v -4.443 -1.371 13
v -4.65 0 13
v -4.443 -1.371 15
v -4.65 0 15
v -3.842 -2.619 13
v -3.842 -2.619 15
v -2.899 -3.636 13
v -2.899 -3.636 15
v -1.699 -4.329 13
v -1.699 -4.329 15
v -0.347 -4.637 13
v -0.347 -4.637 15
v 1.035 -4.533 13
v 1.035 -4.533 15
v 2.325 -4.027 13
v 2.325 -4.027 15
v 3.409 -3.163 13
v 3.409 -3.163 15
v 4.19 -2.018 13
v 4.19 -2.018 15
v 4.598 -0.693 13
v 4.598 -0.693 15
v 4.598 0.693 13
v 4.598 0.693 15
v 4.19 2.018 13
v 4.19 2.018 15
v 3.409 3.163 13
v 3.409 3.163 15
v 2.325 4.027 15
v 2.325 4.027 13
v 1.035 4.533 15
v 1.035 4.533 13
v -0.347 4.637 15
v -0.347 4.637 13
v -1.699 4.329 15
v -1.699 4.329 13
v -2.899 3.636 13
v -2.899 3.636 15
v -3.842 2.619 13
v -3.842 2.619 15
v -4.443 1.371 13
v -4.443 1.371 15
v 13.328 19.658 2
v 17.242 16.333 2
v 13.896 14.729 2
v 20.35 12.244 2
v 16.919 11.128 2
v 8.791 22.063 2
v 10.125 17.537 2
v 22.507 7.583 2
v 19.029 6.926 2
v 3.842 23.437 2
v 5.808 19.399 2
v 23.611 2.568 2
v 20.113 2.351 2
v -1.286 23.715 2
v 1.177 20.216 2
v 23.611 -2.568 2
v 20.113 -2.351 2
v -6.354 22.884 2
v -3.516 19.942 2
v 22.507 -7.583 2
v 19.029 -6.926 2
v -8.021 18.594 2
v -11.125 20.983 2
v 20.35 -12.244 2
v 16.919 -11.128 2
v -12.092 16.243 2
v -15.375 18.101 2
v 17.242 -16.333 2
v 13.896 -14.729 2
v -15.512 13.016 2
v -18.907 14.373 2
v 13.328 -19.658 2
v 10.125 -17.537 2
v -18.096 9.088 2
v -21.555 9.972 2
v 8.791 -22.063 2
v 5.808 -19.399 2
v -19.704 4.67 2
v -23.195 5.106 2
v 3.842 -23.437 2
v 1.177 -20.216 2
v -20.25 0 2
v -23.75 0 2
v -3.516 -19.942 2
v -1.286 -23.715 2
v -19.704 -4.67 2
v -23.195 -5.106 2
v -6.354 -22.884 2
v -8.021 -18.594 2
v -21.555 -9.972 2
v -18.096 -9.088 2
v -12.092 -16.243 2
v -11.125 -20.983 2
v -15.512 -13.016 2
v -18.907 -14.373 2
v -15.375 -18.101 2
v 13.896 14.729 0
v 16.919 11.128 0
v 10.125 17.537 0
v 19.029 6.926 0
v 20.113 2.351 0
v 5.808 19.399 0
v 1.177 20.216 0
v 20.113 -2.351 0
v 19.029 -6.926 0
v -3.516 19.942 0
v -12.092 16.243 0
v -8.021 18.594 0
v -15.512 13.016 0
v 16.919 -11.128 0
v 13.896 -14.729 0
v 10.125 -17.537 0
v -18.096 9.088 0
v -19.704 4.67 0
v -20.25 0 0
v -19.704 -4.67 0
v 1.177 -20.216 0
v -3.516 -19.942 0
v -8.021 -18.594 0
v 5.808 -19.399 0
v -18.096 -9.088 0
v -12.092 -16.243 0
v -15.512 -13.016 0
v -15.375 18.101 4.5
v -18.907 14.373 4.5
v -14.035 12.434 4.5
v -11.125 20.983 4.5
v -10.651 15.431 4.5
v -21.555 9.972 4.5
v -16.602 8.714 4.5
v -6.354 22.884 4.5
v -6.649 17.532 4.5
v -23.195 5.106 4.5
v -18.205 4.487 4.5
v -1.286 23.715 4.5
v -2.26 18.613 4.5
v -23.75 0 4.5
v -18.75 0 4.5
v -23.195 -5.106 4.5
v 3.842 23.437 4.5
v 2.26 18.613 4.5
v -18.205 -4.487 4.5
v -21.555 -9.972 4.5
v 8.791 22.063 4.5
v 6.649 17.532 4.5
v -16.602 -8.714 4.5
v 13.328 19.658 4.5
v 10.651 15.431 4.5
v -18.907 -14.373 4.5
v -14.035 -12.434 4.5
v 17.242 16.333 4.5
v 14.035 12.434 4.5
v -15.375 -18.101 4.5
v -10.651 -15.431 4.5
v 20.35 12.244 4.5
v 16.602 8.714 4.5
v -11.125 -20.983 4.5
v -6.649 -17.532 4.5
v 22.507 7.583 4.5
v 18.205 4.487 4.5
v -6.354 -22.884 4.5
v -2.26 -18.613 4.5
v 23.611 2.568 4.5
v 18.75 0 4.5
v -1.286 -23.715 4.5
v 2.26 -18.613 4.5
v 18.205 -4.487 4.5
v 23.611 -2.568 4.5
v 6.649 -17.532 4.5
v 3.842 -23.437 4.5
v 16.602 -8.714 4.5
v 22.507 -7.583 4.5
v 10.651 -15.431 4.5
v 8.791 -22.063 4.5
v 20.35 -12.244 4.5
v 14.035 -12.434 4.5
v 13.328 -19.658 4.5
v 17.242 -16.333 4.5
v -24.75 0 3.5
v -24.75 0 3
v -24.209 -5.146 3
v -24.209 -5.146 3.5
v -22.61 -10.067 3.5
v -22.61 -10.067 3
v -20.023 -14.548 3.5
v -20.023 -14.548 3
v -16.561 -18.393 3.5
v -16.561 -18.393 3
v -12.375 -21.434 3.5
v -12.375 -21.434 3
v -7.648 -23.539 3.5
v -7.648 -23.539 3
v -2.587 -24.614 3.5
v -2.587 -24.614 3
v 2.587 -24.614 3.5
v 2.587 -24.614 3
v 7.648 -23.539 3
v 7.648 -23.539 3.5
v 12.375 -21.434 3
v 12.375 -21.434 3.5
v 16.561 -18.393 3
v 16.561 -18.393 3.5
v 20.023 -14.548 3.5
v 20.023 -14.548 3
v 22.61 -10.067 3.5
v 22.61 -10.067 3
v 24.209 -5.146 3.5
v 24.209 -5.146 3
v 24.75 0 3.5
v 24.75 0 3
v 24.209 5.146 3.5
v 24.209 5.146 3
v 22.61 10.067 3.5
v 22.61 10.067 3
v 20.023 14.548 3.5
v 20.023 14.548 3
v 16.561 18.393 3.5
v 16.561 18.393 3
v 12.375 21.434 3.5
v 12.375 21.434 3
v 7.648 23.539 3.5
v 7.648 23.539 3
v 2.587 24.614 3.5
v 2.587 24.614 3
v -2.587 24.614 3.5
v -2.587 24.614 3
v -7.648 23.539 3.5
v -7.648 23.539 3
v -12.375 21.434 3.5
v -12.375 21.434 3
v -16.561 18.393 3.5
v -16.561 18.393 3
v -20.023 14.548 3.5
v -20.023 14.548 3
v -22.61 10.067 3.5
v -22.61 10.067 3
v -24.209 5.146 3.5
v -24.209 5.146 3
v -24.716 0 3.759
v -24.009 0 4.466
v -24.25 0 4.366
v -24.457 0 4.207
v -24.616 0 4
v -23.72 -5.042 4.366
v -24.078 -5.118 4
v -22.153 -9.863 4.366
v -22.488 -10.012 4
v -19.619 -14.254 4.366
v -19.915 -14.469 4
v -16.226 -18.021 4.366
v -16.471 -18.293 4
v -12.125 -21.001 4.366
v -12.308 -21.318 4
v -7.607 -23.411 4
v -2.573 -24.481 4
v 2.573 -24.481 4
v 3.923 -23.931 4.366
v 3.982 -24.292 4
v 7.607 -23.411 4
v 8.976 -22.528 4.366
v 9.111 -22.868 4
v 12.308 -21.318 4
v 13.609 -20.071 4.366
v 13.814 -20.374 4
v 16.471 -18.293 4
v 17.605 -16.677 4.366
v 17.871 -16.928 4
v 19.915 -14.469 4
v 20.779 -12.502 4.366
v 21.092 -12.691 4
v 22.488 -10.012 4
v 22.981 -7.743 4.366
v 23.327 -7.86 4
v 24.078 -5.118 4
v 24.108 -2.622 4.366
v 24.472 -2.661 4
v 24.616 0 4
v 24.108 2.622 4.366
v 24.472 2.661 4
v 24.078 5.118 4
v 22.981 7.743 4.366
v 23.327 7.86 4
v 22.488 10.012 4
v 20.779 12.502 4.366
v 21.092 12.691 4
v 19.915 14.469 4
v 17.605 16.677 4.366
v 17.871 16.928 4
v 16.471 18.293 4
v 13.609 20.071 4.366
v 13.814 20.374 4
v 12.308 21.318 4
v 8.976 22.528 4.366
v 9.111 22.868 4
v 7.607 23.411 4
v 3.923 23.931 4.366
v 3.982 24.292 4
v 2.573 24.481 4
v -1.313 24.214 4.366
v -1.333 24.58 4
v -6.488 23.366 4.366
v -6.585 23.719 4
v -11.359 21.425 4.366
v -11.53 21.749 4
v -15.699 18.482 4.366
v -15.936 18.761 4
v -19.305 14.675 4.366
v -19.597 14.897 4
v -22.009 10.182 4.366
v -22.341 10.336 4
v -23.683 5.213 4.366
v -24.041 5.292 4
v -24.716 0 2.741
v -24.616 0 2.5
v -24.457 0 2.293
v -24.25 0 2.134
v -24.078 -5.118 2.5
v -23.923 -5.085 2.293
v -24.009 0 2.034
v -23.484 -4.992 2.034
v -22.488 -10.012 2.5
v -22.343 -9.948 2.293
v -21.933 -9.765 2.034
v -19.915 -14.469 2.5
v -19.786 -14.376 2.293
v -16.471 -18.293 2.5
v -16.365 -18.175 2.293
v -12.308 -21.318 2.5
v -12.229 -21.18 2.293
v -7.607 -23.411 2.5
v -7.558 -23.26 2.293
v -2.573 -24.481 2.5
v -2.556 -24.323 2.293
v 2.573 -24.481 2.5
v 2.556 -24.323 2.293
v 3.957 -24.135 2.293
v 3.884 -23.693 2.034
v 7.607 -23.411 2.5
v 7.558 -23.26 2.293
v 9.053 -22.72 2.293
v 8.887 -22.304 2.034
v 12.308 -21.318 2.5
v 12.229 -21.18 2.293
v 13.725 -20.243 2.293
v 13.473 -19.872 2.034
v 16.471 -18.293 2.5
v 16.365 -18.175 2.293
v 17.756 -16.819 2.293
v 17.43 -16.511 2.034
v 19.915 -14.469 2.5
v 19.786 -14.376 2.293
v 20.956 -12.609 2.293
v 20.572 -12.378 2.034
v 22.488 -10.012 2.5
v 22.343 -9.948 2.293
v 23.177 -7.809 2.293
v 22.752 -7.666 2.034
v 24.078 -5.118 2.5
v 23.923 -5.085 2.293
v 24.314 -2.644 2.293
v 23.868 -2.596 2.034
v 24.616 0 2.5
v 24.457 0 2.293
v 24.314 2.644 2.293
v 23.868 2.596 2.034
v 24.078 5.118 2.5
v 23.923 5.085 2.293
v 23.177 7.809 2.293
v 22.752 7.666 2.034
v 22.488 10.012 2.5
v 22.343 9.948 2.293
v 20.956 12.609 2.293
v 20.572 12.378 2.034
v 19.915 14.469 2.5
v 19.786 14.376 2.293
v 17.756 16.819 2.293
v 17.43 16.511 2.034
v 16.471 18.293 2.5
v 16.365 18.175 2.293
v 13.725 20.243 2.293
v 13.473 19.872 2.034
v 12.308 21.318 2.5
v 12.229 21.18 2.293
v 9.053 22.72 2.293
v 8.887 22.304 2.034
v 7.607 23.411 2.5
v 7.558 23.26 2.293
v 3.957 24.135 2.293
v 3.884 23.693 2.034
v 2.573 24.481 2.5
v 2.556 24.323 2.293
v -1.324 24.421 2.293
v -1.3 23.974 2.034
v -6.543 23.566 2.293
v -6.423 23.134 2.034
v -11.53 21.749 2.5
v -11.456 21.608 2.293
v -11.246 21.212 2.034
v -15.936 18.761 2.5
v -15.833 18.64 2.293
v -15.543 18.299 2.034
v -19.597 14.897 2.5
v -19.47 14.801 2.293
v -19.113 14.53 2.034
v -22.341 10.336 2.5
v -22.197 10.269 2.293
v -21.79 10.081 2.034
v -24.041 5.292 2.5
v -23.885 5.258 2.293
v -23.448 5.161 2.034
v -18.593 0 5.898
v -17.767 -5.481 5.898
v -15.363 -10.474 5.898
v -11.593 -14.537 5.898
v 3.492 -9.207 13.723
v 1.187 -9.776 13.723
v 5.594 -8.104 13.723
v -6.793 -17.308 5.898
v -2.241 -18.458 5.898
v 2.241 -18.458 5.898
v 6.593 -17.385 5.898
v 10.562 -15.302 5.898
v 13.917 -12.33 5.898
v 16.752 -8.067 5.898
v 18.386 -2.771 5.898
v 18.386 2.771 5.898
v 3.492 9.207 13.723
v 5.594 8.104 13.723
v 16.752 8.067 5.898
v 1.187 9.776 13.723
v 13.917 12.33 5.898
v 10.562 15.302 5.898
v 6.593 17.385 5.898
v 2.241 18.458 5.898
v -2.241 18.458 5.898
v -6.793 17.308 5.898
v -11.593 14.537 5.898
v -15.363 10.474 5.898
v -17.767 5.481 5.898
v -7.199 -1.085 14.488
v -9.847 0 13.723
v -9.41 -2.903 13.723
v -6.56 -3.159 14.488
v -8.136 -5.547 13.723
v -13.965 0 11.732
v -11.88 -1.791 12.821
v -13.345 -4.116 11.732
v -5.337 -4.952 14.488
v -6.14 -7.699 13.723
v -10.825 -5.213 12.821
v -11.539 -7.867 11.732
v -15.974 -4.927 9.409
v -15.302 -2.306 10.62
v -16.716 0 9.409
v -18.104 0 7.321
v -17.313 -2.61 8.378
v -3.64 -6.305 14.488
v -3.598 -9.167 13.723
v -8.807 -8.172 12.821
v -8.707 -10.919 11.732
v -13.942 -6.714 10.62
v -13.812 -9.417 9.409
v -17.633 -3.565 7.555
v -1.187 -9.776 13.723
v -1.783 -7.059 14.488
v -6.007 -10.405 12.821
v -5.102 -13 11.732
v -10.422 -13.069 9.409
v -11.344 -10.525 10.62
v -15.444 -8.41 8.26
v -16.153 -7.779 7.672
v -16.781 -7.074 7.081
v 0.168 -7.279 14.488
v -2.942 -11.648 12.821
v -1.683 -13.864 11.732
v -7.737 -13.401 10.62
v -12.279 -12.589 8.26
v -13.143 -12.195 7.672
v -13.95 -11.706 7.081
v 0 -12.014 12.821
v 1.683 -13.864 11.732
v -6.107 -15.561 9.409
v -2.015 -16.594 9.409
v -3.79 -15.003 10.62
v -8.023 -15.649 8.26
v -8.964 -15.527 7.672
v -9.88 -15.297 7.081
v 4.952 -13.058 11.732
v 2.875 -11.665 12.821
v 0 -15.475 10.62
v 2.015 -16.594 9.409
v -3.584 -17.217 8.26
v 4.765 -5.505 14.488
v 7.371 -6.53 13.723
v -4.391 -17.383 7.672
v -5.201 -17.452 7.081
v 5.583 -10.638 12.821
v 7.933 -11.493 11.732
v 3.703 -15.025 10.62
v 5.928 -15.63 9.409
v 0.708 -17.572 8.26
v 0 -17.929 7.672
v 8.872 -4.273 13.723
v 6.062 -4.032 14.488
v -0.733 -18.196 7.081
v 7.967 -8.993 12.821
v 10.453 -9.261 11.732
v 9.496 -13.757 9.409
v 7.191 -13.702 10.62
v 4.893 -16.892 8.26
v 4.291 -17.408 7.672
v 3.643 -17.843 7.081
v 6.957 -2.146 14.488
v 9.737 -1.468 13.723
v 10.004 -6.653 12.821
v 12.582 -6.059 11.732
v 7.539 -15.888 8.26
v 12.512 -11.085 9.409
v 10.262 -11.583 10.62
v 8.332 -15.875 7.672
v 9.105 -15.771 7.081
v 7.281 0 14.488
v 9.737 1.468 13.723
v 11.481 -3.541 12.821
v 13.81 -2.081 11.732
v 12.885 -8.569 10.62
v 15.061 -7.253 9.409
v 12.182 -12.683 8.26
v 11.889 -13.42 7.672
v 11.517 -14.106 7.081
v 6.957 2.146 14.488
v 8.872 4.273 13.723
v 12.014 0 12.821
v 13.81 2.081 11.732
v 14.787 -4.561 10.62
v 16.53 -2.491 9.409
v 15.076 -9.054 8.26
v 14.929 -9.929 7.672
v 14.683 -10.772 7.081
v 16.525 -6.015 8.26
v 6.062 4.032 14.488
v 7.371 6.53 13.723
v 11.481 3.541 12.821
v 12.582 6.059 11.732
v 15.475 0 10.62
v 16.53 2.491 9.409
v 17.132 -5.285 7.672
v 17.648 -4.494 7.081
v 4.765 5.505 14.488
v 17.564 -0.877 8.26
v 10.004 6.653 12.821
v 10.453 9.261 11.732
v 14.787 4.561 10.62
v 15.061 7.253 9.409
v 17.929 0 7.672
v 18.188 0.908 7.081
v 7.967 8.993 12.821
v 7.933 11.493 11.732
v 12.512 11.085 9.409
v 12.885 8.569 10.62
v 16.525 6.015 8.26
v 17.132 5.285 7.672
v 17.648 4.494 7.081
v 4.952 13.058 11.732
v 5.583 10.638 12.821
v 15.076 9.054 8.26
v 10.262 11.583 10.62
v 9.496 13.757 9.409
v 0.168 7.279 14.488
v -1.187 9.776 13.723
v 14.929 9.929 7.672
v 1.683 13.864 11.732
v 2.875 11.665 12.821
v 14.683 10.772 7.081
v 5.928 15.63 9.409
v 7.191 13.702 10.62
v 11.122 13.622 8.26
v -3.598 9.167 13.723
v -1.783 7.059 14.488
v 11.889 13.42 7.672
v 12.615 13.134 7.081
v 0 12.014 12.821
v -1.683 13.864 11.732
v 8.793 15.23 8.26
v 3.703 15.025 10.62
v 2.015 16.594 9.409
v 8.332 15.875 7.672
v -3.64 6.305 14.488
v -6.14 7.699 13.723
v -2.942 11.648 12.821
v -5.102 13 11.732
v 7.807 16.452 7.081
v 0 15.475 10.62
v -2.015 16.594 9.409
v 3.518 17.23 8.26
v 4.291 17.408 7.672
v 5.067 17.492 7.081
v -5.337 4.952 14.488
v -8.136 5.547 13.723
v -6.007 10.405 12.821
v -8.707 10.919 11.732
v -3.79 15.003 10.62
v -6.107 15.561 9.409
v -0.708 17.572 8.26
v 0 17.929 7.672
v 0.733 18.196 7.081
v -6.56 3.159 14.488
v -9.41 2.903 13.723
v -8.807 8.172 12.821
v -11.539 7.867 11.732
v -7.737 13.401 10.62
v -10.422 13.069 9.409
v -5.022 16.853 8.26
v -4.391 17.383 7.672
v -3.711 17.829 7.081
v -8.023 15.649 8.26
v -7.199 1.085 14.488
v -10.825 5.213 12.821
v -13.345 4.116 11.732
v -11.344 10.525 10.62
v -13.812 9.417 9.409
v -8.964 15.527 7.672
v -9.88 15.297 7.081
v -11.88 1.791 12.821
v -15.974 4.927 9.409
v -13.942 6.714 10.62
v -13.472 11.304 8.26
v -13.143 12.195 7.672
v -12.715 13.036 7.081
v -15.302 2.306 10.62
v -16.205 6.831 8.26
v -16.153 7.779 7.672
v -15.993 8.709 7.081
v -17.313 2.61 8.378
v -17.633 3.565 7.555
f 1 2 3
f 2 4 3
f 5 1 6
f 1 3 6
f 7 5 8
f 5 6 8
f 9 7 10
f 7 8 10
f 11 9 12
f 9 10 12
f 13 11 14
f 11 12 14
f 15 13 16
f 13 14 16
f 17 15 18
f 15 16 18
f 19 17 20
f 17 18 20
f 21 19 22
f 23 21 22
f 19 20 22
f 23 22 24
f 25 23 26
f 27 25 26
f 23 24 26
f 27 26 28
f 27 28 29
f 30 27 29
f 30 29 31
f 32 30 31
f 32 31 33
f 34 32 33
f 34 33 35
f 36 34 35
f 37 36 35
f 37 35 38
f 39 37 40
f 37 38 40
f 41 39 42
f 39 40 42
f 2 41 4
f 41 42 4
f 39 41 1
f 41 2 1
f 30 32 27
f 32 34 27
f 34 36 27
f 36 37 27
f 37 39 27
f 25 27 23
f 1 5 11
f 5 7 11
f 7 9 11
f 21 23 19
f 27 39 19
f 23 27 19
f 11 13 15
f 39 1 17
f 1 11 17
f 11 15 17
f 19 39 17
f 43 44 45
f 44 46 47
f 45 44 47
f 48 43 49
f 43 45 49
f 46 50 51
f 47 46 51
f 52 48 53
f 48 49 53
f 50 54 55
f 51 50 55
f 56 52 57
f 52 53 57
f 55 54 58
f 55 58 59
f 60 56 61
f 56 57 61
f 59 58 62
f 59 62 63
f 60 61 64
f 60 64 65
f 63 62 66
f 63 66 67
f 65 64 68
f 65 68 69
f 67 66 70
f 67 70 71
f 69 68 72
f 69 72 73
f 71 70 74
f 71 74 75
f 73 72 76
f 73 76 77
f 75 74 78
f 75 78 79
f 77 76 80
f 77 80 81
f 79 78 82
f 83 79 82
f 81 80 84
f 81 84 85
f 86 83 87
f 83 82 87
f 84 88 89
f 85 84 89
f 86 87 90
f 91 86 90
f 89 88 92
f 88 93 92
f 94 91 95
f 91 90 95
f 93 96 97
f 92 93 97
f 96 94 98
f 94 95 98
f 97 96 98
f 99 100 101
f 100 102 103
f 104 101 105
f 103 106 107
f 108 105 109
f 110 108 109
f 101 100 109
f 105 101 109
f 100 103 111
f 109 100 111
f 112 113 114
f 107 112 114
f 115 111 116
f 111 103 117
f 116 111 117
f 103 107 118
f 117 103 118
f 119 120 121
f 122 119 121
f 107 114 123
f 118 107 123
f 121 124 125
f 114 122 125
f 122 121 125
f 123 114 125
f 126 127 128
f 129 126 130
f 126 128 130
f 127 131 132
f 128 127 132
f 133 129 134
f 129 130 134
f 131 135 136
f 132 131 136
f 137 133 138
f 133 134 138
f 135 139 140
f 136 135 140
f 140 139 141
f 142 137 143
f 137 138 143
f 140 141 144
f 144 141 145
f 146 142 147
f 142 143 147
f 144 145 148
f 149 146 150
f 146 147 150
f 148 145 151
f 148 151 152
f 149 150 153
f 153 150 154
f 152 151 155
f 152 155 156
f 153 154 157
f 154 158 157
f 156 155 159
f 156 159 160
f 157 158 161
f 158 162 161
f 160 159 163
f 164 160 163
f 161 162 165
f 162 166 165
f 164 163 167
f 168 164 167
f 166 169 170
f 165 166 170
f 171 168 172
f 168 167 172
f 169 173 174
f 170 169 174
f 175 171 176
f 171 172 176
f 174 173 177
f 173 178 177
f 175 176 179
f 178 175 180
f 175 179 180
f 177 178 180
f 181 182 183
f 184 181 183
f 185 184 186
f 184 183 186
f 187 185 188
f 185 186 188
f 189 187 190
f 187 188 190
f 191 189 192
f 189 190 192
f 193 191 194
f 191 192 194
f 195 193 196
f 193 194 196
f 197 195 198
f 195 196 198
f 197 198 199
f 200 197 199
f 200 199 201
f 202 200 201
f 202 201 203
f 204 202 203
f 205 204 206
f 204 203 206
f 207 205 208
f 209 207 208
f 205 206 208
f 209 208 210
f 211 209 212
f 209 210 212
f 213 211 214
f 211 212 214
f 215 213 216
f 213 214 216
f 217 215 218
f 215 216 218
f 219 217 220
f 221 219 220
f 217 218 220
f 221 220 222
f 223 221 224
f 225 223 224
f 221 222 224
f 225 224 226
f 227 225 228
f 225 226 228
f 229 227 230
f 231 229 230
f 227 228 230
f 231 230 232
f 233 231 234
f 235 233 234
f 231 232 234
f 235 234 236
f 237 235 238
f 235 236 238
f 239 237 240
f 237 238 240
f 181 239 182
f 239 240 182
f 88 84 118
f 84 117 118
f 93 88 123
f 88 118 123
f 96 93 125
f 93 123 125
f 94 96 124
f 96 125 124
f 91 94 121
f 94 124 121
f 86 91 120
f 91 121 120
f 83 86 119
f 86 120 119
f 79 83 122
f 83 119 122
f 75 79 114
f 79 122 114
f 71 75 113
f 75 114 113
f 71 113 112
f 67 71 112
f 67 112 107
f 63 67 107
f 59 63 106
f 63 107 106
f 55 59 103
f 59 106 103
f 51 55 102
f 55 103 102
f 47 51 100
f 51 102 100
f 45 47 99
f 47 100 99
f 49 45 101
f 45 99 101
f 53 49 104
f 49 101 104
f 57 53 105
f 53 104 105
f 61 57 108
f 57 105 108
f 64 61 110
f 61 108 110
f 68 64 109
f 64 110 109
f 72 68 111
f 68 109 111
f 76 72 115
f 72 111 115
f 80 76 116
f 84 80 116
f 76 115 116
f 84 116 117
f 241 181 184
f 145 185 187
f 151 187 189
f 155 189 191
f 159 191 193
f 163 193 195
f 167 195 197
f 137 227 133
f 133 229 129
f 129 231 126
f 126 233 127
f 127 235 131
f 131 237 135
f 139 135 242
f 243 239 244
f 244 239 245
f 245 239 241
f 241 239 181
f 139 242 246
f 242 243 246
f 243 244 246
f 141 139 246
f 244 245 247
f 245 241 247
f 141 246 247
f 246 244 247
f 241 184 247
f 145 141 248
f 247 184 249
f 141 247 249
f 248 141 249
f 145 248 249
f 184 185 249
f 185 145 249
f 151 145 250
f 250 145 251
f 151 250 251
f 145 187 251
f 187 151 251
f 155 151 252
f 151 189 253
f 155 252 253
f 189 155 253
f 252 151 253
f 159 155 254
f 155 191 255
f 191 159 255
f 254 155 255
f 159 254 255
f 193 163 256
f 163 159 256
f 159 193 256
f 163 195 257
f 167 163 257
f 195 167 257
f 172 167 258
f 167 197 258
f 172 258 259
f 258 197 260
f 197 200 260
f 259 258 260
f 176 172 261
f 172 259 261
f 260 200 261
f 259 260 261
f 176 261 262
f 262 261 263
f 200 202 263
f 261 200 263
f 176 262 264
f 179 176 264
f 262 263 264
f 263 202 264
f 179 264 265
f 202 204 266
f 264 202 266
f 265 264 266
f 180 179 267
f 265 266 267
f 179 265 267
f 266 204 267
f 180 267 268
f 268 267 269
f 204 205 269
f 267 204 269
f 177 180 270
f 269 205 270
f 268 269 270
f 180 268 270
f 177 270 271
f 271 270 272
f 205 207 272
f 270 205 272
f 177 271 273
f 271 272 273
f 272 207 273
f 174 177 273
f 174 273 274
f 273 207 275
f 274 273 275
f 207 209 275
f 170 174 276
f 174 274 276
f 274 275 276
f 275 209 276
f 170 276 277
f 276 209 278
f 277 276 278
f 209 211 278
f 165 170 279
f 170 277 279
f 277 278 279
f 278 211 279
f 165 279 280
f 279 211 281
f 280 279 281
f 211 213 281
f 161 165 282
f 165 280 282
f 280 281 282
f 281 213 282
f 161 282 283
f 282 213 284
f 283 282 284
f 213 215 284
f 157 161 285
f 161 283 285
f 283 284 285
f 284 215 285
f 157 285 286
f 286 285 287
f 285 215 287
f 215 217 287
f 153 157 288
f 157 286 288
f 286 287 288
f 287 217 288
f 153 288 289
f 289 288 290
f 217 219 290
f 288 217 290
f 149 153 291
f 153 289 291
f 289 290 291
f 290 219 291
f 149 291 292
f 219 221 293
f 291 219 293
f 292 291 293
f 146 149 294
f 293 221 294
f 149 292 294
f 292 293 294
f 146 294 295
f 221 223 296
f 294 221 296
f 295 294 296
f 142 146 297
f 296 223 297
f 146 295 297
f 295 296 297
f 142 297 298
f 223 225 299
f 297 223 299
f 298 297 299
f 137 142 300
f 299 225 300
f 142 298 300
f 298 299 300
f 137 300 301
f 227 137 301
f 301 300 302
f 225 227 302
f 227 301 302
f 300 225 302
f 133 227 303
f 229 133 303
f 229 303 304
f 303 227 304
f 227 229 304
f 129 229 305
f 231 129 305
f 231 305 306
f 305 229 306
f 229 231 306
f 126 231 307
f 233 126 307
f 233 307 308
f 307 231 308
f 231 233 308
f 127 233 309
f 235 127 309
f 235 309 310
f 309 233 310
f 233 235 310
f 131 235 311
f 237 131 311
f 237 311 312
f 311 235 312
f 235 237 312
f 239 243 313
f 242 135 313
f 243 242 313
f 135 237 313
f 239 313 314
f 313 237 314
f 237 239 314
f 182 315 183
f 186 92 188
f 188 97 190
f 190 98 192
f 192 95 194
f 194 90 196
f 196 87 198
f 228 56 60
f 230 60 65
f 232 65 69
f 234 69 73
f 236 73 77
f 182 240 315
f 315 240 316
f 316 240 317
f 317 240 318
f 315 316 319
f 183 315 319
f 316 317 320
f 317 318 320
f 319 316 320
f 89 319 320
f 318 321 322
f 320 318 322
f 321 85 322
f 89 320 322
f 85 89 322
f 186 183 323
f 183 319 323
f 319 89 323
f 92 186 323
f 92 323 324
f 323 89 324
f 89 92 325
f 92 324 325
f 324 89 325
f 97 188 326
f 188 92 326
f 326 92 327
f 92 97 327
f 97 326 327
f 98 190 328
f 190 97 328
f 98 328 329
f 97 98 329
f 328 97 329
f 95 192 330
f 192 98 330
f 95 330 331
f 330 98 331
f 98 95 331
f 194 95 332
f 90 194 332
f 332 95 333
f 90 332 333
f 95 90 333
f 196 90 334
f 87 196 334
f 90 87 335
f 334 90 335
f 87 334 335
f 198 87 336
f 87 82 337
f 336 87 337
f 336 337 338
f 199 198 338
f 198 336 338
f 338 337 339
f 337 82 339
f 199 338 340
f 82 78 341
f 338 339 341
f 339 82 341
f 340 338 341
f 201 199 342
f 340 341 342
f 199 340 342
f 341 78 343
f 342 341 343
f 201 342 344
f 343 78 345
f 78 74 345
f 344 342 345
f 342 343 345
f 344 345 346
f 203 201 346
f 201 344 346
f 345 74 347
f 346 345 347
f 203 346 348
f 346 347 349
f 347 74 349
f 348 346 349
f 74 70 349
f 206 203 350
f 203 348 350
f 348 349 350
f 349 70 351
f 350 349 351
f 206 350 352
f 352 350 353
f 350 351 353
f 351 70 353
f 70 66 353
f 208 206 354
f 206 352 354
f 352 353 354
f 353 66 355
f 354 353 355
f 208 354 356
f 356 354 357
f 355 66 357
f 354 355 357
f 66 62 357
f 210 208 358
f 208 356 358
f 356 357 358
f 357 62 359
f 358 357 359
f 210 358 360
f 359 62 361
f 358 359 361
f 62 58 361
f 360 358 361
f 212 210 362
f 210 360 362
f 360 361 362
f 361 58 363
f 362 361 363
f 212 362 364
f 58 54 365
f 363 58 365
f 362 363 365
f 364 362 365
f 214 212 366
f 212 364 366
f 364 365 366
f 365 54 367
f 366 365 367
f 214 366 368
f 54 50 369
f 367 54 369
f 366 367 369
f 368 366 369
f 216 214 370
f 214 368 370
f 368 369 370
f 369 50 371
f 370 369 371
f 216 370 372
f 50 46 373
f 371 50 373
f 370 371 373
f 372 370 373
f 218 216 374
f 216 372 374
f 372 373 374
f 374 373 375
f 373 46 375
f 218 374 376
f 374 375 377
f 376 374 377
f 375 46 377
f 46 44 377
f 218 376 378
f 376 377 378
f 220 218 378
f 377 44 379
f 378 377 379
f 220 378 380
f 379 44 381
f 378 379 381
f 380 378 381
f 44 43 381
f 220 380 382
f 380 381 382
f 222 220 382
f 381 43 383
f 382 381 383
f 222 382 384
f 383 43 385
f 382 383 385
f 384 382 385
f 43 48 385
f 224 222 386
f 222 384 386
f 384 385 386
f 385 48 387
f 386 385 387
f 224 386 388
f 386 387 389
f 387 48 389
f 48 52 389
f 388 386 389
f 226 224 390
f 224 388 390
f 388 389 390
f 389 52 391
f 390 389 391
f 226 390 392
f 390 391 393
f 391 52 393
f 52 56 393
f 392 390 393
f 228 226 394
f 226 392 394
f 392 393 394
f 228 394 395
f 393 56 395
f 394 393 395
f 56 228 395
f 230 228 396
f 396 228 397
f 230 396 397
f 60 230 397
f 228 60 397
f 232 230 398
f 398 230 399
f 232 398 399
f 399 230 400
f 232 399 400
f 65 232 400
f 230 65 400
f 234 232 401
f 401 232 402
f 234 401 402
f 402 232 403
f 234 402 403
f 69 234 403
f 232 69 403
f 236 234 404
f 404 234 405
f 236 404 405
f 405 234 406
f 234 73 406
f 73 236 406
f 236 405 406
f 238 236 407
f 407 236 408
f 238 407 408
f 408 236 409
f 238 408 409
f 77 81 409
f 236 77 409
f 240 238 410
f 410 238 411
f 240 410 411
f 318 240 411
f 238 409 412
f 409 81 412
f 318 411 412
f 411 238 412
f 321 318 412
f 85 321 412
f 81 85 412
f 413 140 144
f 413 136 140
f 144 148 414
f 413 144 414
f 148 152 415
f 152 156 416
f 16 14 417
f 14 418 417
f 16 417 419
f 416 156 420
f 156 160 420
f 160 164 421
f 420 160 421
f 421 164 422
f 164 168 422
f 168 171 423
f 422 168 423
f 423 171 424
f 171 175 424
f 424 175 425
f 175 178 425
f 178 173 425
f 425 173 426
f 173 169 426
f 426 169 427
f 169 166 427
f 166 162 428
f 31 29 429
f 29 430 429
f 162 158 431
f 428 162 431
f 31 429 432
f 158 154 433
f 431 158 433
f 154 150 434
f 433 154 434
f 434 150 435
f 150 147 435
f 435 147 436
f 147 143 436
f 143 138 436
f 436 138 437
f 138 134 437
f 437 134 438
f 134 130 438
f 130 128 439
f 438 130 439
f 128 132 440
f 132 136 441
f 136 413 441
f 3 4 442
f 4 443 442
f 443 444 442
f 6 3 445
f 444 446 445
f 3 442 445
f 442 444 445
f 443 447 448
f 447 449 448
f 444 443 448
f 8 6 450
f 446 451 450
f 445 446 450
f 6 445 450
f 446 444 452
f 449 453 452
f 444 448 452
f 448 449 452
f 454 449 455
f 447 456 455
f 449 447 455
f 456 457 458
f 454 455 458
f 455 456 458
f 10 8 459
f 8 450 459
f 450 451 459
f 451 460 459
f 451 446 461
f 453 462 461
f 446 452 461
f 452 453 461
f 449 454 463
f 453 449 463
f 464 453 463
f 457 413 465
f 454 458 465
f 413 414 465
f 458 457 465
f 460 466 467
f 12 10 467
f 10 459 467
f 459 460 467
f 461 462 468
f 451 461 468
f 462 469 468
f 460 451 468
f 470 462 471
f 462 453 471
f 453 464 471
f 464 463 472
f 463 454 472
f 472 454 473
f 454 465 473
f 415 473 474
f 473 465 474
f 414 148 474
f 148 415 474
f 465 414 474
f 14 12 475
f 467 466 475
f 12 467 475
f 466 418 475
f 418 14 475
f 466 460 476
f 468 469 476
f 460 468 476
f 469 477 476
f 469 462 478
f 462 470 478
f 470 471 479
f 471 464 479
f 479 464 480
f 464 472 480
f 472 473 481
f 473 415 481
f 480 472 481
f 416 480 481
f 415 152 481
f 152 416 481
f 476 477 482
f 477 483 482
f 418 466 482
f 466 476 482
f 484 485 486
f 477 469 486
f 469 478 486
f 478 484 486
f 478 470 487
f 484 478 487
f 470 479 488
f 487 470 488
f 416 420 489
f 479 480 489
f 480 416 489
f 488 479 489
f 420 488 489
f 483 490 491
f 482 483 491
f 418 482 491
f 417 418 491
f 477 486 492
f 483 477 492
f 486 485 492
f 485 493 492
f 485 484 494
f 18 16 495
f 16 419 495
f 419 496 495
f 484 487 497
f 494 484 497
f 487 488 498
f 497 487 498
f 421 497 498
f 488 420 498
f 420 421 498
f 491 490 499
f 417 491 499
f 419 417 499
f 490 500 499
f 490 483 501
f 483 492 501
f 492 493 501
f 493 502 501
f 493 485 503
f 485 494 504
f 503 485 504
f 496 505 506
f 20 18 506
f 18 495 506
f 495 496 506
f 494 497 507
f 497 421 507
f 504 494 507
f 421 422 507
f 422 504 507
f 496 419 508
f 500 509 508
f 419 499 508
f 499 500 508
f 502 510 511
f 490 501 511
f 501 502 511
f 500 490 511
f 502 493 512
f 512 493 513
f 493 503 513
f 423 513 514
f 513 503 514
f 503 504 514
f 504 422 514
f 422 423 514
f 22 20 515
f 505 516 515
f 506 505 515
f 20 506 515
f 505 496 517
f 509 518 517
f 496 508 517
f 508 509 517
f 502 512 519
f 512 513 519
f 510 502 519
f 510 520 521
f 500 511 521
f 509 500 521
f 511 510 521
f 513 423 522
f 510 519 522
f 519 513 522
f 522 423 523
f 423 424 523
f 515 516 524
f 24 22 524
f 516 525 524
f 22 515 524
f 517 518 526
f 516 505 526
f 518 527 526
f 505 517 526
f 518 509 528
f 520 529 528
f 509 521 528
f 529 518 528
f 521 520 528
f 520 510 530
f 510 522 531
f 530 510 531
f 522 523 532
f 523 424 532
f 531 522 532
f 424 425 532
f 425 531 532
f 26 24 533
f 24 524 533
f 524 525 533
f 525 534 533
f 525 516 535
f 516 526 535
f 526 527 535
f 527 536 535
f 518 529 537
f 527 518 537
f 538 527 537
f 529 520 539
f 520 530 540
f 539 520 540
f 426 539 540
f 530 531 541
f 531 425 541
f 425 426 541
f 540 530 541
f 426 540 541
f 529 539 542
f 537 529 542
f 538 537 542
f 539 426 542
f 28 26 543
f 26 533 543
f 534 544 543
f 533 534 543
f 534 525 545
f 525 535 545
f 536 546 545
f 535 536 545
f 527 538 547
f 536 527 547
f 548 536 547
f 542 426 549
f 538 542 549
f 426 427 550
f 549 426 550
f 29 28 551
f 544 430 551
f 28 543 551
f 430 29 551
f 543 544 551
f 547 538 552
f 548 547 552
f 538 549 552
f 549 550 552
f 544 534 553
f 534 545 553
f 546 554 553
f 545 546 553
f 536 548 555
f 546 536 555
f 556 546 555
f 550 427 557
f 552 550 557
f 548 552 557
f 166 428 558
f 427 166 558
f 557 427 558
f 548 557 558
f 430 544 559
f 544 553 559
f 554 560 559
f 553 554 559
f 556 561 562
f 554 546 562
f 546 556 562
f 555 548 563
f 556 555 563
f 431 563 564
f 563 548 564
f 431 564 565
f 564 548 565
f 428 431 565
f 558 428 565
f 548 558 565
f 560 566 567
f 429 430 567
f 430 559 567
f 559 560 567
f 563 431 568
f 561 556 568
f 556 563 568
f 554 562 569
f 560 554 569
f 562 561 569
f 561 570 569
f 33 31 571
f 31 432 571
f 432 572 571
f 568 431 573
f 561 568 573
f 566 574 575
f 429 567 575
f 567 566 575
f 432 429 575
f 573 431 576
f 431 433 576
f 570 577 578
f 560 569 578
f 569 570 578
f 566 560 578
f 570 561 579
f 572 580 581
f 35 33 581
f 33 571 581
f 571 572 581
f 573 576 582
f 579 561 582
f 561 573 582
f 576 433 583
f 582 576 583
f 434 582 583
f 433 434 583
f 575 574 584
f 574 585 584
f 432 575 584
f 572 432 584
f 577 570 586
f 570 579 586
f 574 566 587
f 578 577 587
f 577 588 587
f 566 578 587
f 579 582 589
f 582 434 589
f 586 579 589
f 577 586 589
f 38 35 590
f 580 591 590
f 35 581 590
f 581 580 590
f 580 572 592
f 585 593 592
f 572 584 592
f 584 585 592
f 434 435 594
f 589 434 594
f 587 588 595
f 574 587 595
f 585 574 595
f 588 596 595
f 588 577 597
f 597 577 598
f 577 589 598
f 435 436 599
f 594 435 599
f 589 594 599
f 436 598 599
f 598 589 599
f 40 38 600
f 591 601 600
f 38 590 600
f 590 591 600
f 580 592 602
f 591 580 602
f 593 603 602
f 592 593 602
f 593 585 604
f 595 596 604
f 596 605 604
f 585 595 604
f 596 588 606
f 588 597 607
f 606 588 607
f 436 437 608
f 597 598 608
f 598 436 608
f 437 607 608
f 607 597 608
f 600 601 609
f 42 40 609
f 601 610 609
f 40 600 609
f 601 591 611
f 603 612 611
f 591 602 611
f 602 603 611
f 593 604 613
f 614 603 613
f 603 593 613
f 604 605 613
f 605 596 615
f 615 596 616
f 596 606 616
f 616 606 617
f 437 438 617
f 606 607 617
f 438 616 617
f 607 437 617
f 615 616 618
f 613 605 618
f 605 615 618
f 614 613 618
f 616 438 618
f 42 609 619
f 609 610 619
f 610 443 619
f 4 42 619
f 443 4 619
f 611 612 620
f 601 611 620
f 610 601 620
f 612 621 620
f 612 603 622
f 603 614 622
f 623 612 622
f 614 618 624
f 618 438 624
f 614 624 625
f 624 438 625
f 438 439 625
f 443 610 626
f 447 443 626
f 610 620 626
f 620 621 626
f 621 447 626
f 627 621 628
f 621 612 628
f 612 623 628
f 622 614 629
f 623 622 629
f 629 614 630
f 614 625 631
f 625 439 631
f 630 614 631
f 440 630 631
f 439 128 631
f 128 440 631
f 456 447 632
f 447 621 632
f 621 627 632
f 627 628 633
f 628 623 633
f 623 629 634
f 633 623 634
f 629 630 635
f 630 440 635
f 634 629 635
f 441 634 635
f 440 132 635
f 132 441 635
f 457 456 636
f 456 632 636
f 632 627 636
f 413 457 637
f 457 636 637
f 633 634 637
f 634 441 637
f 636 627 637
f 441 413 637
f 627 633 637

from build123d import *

# Parameters (mm, degrees)
F2_R = 1


with BuildPart() as f1:
    # F0 (on Front) → F1 (revolve)
    with BuildSketch(Plane.XZ):
        with BuildLine():
            Line((-20.25, 0), (0, 0))
            Line((0, 0), (0, 13))
            Line((0, 13), (-4.65, 13))
            Line((-4.65, 13), (-4.65, 15))
            add(Edge.make_bspline(
                [(-4.65, 15), (-18.75, 12.9134615385), (-18.75, 4.5)],
                knots=[4.9630041935, 4.9630041935, 4.9630041935, 6.2831853072, 6.2831853072, 6.2831853072], degree=2, weights=[1, 0.7899367063, 1]))
            Line((-18.75, 4.5), (-24.75, 4.5))
            Line((-24.75, 4.5), (-24.75, 2))
            Line((-24.75, 2), (-20.25, 2))
            Line((-20.25, 2), (-20.25, 0))
        make_face()
    revolve(axis=Axis((0, 0, 6.5), (0, 0, 1)))

    # F2
    f2_edges = [f1.edges().sort_by_distance(p)[0] for p in [
        (24.75, 0, 4.5),
        (24.75, 0, 2),
    ]]
    fillet(f2_edges, radius=F2_R)


solid = f1.part
